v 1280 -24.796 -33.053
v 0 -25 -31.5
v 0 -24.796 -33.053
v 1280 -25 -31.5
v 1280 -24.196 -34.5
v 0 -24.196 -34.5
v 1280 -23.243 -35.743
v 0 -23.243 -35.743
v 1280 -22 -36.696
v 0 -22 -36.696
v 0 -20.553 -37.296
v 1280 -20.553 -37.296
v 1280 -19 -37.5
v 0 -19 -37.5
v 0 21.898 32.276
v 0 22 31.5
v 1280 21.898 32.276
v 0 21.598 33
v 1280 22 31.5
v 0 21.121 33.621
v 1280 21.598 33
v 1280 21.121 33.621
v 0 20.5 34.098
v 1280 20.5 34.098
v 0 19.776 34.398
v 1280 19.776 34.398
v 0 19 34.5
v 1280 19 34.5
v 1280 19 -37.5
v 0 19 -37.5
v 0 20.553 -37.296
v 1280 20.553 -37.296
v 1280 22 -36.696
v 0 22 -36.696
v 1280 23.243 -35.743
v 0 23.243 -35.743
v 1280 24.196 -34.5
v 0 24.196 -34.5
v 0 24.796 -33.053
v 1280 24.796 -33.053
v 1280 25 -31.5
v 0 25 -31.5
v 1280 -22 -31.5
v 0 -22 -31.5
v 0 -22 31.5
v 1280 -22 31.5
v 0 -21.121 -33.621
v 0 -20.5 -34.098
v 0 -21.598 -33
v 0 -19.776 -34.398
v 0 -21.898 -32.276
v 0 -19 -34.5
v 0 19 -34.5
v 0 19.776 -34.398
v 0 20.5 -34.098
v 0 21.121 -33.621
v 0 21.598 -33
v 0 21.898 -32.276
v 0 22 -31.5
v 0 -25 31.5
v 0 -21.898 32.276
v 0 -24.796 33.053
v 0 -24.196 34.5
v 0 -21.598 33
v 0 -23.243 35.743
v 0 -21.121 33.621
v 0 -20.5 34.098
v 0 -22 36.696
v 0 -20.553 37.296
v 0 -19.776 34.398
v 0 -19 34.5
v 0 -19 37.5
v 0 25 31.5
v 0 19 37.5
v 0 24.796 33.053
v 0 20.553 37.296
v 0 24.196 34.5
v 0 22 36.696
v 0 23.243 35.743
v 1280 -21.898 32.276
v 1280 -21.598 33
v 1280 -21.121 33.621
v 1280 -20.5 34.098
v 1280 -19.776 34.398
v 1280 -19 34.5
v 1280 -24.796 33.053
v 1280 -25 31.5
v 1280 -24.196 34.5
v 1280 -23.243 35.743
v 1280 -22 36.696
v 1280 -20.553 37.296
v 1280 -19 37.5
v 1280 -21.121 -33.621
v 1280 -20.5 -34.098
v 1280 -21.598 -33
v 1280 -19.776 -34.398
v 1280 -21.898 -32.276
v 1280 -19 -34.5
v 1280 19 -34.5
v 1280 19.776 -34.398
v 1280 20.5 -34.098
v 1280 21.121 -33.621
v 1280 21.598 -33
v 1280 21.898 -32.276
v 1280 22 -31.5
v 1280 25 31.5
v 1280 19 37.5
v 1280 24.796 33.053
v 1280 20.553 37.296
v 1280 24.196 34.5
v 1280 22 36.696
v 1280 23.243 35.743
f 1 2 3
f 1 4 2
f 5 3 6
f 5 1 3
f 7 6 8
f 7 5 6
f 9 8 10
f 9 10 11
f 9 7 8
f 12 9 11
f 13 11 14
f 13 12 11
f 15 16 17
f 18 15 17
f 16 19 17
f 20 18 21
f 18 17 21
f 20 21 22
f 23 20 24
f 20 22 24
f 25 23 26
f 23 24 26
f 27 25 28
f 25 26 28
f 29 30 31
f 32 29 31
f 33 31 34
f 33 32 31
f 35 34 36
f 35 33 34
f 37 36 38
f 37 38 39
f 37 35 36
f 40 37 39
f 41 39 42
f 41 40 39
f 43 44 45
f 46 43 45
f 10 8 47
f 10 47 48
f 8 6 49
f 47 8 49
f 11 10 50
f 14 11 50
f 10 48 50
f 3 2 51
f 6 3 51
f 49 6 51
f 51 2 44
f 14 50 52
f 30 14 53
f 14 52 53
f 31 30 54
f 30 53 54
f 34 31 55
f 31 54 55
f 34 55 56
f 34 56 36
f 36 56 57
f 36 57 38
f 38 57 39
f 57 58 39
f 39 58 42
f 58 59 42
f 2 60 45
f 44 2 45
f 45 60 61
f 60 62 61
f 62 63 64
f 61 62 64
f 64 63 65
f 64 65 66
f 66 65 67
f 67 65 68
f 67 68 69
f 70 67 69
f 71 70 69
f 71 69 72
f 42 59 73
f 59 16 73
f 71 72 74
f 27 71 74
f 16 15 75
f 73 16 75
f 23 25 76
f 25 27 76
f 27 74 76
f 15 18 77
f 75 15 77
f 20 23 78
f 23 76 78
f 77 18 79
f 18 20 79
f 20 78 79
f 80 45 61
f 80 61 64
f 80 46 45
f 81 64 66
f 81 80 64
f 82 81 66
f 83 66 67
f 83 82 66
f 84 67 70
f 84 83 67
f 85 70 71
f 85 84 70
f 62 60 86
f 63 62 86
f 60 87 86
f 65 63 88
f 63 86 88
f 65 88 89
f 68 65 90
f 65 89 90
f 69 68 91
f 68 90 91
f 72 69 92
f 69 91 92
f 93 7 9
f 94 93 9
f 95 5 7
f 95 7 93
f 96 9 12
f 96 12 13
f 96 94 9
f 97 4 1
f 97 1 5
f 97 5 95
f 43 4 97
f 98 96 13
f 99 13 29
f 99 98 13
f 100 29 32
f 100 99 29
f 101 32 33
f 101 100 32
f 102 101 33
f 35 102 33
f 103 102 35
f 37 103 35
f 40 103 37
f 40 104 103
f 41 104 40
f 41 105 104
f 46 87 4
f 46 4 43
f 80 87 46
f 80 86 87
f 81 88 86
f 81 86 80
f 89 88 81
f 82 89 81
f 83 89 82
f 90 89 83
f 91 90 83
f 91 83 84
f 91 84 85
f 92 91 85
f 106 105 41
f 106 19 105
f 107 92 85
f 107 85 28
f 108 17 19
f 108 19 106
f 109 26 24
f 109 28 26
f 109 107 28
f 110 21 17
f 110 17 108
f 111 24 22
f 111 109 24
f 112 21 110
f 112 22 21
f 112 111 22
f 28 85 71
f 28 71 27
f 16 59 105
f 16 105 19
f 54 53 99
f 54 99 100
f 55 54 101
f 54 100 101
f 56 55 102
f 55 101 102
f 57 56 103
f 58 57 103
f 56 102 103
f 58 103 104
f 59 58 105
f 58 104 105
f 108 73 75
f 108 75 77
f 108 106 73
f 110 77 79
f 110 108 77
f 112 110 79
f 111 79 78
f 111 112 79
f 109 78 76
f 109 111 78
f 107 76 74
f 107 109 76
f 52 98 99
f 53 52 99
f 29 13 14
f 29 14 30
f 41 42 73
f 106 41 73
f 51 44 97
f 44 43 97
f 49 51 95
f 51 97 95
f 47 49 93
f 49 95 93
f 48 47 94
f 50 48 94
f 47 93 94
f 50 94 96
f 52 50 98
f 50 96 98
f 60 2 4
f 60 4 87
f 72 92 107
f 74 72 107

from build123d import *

# Parameters (mm, degrees)
F0_W     = 50
F0_H     = 75
F1_DEPTH = 1280
F2_R     = 6
F3_T     = -3


with BuildPart() as f1:
    # F0 (on Right) → F1 (new body)
    with BuildSketch(Plane.YZ):
        Rectangle(F0_W, F0_H)
    extrude(amount=F1_DEPTH)

    # F2
    f2_edges = [f1.edges().sort_by_distance(p)[0] for p in [
        (640, 25, 37.5),
        (640, -25, 37.5),
        (640, 25, -37.5),
        (640, -25, -37.5),
    ]]
    fillet(f2_edges, radius=F2_R)

    # F3
    f3_openings = [f1.faces().sort_by_distance(p)[0] for p in [
        (0, 0, 0),
        (1280, 0, 0),
    ]]
    offset(amount=F3_T, openings=f3_openings)


solid = f1.part
